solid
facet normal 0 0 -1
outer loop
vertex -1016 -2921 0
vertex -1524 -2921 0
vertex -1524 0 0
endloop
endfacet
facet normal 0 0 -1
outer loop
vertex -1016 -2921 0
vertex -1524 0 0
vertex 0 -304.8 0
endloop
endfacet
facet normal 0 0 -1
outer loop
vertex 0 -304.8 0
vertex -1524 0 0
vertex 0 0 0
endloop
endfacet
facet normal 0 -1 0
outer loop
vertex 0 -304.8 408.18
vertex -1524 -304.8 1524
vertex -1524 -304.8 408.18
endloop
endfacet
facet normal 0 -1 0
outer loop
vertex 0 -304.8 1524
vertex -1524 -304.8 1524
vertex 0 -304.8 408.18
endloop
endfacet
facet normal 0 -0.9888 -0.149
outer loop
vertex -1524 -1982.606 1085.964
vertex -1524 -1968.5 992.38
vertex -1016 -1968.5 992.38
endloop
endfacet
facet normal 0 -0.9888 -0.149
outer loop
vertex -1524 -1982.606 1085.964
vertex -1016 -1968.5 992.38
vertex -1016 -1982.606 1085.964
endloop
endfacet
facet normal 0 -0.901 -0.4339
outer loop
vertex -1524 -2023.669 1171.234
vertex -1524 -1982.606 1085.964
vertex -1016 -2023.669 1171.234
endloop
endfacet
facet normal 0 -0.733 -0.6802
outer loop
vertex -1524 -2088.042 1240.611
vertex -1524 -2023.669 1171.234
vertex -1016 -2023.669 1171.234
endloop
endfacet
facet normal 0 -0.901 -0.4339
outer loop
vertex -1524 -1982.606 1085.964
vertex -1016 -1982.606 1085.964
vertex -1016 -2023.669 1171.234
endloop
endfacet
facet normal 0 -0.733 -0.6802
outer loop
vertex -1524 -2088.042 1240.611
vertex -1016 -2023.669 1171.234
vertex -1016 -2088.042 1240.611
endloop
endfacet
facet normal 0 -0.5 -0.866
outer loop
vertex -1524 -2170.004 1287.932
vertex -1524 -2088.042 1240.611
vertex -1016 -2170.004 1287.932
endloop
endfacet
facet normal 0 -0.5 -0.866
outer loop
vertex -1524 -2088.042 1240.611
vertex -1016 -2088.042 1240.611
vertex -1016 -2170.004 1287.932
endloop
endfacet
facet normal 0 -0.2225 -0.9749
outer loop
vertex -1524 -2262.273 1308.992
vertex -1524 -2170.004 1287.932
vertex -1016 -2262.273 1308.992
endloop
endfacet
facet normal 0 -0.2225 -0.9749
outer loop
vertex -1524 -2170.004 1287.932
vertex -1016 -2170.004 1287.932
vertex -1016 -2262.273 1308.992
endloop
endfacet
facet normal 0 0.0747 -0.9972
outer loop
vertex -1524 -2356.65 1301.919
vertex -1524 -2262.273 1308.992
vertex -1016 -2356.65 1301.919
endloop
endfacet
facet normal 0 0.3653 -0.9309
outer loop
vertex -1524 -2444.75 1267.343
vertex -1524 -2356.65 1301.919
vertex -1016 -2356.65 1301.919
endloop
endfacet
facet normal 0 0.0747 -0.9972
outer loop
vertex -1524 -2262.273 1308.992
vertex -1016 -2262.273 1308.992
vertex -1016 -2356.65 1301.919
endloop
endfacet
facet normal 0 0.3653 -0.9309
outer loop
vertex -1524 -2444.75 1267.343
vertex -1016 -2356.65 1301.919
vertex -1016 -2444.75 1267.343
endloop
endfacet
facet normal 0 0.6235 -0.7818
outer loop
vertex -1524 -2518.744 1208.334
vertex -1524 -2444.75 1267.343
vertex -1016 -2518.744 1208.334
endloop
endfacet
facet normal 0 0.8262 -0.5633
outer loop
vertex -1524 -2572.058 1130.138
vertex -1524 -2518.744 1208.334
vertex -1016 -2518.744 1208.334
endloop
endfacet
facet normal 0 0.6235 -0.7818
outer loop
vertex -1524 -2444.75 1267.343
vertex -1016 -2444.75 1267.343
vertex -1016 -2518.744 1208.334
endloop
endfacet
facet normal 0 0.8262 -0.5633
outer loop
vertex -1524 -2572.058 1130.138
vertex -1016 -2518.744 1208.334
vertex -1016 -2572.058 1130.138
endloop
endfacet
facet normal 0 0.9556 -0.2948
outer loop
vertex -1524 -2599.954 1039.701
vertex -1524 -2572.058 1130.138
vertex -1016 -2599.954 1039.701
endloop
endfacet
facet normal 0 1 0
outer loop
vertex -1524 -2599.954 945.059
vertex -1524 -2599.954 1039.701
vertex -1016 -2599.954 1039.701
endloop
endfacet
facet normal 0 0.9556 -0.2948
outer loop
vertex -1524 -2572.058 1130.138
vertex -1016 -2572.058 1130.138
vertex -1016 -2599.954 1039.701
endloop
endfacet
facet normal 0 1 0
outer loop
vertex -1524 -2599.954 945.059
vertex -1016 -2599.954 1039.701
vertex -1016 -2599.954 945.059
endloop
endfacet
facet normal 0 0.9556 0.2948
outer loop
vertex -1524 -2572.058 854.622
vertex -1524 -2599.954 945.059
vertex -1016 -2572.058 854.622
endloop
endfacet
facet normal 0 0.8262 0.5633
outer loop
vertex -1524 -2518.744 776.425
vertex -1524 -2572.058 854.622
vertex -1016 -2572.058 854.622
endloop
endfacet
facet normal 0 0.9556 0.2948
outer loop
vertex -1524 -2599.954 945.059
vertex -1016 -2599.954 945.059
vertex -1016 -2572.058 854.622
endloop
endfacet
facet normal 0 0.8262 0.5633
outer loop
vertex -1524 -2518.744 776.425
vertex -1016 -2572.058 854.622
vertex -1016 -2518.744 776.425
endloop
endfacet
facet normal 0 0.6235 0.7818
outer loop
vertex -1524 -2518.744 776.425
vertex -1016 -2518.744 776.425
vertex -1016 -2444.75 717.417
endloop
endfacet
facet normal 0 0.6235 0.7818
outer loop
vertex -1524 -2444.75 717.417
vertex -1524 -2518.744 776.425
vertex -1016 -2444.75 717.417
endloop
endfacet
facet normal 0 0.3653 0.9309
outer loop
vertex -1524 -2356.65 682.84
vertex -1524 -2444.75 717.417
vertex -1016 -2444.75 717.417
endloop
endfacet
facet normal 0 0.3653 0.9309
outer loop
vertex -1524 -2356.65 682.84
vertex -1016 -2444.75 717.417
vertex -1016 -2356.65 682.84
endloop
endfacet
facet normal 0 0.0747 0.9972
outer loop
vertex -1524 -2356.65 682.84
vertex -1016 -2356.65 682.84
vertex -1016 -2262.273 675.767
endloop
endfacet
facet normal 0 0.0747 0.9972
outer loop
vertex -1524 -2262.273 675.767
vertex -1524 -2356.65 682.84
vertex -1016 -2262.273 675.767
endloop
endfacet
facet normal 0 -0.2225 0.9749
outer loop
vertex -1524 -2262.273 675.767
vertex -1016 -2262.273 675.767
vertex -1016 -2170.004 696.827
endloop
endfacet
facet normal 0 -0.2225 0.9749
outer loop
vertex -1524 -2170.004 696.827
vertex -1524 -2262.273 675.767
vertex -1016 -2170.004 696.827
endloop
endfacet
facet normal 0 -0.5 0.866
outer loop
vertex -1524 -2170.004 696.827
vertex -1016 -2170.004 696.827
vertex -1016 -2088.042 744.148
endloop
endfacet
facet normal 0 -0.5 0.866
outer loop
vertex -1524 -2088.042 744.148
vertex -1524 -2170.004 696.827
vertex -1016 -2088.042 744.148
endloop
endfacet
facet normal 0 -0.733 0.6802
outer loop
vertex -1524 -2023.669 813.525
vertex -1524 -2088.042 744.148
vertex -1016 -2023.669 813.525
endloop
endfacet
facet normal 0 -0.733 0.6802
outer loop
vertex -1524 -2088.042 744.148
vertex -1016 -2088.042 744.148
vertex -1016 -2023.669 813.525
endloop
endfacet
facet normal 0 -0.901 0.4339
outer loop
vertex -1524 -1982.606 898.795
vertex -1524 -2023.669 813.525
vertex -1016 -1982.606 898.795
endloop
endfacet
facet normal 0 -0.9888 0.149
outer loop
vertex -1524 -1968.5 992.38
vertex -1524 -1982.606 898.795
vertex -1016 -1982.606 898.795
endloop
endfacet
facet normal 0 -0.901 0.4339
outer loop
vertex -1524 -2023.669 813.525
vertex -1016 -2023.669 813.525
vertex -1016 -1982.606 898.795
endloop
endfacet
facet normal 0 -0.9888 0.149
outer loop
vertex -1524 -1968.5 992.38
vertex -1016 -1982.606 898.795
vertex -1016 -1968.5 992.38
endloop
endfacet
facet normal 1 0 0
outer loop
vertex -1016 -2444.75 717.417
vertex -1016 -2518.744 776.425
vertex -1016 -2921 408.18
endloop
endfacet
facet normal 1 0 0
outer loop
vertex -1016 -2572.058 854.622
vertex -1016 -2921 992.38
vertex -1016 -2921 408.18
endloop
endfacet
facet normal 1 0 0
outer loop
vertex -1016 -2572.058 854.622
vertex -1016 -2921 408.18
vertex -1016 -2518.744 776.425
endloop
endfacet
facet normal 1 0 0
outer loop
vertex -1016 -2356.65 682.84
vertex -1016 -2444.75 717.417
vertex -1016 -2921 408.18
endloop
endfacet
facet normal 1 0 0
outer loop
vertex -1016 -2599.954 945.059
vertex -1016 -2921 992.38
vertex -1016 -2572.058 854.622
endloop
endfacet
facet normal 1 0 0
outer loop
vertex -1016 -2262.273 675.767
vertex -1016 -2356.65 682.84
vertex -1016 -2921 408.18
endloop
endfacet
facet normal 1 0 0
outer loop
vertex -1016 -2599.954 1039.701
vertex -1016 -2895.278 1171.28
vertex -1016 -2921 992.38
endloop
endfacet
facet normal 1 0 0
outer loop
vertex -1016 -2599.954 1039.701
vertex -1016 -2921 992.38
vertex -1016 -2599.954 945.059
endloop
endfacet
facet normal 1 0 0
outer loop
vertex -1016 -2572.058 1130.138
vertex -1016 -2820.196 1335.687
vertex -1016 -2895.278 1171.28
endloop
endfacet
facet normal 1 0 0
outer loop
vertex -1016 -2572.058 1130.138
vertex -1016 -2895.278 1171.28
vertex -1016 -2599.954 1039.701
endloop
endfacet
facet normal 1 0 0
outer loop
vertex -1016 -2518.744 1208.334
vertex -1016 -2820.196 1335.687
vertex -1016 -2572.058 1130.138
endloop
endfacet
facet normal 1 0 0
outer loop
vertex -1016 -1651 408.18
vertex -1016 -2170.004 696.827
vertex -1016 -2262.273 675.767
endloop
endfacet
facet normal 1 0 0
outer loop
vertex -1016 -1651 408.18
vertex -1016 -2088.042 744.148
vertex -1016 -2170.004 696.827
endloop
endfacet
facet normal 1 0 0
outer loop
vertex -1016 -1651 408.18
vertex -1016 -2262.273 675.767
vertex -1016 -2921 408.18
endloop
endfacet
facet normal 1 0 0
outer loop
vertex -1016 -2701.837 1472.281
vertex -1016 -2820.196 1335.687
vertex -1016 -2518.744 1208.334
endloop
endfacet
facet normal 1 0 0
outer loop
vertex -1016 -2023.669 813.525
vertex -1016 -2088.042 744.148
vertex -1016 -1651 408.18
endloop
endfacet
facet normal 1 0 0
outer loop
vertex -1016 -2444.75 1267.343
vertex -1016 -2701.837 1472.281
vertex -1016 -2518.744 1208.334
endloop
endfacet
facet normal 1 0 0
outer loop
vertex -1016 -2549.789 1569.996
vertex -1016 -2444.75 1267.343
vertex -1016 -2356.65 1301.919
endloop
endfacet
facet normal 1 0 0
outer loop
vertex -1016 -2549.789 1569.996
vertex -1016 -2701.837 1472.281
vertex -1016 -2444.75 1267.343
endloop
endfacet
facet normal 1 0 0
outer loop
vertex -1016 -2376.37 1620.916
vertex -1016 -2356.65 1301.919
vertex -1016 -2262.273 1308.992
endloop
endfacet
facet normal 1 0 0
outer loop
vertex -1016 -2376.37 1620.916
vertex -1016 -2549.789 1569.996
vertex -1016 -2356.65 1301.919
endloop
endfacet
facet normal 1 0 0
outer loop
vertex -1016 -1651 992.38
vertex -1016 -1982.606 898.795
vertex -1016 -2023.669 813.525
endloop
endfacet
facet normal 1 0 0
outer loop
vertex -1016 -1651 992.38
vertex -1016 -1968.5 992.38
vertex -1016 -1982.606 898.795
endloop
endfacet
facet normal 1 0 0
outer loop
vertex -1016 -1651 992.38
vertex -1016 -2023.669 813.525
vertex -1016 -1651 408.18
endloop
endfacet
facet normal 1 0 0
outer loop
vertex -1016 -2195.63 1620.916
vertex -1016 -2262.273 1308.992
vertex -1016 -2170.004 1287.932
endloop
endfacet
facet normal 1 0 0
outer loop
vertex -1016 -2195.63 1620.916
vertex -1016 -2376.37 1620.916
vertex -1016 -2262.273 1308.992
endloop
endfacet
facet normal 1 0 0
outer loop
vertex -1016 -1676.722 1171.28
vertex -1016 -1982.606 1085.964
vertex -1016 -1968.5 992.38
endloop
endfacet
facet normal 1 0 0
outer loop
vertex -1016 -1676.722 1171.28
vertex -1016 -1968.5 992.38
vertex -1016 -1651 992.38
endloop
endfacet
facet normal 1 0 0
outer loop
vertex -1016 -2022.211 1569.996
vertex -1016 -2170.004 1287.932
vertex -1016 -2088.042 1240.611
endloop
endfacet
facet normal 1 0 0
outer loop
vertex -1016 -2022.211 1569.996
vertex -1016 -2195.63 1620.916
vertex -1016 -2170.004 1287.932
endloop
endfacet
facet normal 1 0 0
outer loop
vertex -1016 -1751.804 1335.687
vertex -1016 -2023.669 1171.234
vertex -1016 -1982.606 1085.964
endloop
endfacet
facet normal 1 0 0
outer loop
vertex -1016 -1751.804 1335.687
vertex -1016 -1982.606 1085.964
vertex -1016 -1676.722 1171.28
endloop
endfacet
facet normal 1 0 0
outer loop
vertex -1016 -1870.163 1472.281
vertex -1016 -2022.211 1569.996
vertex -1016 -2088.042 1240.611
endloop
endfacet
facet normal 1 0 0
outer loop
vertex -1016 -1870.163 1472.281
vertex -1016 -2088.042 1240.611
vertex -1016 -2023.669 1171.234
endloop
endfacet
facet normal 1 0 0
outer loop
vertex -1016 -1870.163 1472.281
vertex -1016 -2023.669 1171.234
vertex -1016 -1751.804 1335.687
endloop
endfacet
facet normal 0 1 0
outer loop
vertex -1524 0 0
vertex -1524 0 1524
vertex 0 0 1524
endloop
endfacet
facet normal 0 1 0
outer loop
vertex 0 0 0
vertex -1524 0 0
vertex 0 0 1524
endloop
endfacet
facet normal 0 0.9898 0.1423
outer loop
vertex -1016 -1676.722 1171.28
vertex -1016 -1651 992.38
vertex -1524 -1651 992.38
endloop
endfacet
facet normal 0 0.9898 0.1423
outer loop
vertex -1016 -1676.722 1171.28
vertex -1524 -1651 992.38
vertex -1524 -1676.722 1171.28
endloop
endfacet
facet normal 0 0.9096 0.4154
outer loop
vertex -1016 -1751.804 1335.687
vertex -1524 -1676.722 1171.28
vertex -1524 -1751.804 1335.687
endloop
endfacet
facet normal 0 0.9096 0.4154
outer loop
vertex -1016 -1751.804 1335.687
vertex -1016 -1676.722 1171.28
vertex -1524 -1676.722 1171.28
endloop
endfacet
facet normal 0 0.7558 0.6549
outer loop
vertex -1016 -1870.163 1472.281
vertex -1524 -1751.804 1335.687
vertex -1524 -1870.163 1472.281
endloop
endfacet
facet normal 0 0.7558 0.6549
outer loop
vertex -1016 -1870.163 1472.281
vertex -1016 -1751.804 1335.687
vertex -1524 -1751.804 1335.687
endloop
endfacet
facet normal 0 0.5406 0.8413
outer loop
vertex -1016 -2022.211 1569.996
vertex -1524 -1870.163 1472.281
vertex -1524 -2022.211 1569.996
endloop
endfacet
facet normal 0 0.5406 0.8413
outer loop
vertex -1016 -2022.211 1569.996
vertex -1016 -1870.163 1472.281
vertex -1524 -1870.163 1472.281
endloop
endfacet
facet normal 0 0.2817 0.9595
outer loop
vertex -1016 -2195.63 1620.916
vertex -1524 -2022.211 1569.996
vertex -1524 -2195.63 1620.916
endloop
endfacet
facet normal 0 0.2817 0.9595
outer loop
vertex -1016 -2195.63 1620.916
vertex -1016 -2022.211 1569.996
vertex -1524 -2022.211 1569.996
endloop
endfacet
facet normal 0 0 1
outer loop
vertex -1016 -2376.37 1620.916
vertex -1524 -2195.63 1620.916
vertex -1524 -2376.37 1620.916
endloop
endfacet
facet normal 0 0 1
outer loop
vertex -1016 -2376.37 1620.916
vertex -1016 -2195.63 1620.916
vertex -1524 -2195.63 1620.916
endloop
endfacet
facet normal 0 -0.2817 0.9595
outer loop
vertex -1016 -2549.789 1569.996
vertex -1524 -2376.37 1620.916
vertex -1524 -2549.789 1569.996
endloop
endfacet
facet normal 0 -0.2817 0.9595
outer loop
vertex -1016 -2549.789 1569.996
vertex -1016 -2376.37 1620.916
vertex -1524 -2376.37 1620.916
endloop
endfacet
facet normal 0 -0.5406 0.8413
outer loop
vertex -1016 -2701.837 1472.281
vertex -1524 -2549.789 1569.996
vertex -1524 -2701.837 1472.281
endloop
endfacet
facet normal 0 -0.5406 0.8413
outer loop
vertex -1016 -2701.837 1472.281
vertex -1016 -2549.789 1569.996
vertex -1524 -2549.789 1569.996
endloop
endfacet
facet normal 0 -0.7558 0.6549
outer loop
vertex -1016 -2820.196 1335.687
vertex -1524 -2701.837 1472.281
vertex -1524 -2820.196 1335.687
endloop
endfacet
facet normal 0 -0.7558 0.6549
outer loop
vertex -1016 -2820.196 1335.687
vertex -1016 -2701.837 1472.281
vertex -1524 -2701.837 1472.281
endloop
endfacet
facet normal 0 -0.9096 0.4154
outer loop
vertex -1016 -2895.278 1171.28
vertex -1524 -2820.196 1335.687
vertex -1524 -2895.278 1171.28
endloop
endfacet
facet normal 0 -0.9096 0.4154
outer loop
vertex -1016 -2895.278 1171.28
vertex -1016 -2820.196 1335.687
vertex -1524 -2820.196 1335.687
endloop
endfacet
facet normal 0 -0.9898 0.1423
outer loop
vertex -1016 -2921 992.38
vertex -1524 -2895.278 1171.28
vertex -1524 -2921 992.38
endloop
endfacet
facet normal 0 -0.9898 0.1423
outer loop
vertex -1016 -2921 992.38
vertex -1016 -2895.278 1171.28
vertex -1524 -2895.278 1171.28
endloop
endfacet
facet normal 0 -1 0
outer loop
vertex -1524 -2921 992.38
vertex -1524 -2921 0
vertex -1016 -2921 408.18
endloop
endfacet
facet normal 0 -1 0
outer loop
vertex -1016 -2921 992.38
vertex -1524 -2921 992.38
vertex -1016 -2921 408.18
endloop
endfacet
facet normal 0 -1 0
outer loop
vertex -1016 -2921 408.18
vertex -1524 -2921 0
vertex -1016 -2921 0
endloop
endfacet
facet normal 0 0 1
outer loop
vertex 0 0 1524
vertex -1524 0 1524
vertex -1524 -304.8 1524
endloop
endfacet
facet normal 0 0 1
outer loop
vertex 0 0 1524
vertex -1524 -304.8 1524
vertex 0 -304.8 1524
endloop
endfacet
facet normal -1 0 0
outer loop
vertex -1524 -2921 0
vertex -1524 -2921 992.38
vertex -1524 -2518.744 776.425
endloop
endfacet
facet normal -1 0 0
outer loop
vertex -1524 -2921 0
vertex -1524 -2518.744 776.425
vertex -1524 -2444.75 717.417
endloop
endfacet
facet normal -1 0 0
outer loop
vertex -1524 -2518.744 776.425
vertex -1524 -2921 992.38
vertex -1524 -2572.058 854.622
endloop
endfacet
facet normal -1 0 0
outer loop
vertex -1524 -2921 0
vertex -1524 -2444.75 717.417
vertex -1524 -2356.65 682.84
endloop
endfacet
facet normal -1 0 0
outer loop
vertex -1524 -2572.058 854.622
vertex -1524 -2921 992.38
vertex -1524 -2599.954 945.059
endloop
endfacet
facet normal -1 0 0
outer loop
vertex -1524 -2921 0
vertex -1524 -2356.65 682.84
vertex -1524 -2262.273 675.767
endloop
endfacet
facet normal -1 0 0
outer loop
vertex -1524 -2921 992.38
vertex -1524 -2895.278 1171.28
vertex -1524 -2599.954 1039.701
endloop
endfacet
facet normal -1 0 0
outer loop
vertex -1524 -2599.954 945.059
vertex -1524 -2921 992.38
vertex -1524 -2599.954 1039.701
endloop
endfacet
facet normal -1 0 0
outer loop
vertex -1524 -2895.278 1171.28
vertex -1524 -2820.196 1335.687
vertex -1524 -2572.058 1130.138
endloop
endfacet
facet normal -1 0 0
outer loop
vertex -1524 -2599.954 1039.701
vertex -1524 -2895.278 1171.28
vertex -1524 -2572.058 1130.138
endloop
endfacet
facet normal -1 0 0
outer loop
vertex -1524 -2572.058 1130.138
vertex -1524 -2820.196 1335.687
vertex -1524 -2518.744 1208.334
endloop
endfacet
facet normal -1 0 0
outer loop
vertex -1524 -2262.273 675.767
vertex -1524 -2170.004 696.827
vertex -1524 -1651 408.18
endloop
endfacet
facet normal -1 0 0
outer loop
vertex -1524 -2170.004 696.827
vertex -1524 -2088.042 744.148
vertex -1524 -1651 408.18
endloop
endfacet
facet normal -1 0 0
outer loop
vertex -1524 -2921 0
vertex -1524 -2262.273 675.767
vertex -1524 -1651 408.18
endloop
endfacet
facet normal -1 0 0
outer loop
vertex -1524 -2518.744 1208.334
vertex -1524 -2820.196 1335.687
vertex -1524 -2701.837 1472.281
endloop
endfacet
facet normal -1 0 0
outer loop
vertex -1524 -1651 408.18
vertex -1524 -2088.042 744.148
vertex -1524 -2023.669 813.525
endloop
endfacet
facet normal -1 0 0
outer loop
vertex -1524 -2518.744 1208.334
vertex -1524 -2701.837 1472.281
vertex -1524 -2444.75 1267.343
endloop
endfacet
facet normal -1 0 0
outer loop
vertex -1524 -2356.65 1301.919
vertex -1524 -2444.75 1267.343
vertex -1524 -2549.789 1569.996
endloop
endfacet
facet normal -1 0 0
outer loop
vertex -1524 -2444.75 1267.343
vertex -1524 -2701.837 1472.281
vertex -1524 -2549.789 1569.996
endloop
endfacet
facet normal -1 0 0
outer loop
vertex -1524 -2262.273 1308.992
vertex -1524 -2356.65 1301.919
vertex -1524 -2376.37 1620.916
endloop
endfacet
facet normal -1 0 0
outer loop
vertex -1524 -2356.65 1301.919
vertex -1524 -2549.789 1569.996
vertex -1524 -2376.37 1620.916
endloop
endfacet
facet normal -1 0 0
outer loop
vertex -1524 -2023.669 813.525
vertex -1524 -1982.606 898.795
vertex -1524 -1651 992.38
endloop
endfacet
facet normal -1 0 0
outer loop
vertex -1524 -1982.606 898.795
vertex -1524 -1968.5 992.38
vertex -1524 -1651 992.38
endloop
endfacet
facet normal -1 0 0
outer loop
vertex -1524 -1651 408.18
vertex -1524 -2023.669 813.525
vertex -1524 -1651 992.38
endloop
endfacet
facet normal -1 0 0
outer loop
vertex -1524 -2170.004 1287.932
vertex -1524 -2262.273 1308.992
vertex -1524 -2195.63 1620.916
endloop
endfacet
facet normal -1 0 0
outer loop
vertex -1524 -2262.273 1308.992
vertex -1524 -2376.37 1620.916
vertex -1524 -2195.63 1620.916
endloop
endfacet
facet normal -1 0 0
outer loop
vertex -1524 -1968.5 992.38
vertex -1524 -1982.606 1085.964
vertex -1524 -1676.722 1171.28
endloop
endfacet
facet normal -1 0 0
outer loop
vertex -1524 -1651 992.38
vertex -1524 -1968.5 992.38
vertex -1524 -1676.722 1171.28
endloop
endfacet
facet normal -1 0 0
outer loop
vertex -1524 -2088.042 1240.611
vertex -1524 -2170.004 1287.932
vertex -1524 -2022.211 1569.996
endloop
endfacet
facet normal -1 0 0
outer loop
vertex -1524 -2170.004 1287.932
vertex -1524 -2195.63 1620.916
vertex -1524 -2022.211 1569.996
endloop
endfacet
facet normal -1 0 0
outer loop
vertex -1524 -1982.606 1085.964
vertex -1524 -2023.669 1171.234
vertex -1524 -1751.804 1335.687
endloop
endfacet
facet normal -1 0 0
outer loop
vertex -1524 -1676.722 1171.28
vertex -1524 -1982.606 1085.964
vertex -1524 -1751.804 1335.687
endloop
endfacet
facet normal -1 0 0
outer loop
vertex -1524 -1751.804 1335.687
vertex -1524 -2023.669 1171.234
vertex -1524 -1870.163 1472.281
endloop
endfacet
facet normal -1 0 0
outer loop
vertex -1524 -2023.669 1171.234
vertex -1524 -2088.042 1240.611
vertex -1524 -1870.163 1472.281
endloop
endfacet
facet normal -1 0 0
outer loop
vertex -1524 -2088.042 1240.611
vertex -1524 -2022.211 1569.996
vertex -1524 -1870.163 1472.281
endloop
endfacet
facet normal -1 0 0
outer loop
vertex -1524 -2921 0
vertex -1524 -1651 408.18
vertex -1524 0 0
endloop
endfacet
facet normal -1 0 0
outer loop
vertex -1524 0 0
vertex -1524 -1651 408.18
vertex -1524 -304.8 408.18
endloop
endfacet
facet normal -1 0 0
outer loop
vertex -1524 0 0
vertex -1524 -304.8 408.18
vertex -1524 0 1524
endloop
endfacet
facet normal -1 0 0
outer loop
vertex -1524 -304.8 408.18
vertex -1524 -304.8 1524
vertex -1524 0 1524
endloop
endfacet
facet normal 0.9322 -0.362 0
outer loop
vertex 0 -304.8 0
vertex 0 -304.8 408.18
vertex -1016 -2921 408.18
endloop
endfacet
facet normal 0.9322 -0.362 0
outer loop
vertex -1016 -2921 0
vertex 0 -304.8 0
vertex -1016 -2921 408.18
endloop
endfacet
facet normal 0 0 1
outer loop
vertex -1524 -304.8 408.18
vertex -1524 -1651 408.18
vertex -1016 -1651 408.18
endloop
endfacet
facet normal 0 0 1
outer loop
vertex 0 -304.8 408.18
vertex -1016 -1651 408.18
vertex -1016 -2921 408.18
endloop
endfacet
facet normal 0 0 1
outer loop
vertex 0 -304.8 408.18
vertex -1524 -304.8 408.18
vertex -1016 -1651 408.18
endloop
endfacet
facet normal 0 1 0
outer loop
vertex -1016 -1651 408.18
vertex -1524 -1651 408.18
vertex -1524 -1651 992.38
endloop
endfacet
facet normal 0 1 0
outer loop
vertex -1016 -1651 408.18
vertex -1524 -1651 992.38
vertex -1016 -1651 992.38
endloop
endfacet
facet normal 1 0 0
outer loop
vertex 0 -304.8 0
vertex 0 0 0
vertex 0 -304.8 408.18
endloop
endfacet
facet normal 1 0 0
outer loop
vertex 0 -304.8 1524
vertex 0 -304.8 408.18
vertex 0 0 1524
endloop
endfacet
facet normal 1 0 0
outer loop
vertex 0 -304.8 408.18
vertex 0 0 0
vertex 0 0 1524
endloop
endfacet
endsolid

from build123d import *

# Parameters (mm, degrees)
F0_W      = 1524
F0_H      = 1524
F1_DEPTH  = 304.8
F2_W      = 1524
F2_H      = 408.1796109676
F3_DEPTH  = 2616.2
F4_W      = 508
F4_H      = 1270
F5_DEPTH  = 584.2
F7_DEPTH  = 508
F8_R      = 317.5
F9_DEPTH  = 508
F11_DEPTH = 579.12


with BuildPart() as f1:
    # F0 (on Front) → F1 (new body)
    with BuildSketch(Plane.XZ):
        with Locations((-762, 762)):
            Rectangle(F0_W, F0_H)
    extrude(amount=F1_DEPTH)

    # F2 (on face) → F3 (join)
    with BuildSketch(Plane.XZ.offset(304.8)):
        with Locations((-762, 204.0898054838)):
            Rectangle(F2_W, F2_H)
    extrude(amount=F3_DEPTH)

    # F4 (on face) → F5 (join)
    with BuildSketch(Plane.XY.offset(408.1796109676)):
        with Locations((-1270, -2286)):
            Rectangle(F4_W, F4_H)
    extrude(amount=F5_DEPTH)

    # F6 (on face) → F7 (join)
    with BuildSketch(Plane.YZ.offset(-1016)):
        with BuildLine():
            Line((-2921, 992.3796109676), (-1651, 992.3796109676))
            ThreePointArc((-1651, 992.3796109676), (-2286, 1627.3796109676), (-2921, 992.3796109676))
        make_face()
    extrude(amount=-F7_DEPTH)

    # F8 (on face) → F9 (cut)
    with BuildSketch(Plane.YZ.offset(-1016)):
        with Locations((-2286, 992.3796109676)):
            Circle(F8_R)
    extrude(amount=-F9_DEPTH, mode=Mode.SUBTRACT)

    # F10 (on face) → F11 (cut)
    with BuildSketch(Plane.XY.offset(408.1796109676)):
        Polygon((0, -304.8), (-1016, -2921), (0, -2921), align=None)
    extrude(amount=-F11_DEPTH, mode=Mode.SUBTRACT)


solid = f1.part
